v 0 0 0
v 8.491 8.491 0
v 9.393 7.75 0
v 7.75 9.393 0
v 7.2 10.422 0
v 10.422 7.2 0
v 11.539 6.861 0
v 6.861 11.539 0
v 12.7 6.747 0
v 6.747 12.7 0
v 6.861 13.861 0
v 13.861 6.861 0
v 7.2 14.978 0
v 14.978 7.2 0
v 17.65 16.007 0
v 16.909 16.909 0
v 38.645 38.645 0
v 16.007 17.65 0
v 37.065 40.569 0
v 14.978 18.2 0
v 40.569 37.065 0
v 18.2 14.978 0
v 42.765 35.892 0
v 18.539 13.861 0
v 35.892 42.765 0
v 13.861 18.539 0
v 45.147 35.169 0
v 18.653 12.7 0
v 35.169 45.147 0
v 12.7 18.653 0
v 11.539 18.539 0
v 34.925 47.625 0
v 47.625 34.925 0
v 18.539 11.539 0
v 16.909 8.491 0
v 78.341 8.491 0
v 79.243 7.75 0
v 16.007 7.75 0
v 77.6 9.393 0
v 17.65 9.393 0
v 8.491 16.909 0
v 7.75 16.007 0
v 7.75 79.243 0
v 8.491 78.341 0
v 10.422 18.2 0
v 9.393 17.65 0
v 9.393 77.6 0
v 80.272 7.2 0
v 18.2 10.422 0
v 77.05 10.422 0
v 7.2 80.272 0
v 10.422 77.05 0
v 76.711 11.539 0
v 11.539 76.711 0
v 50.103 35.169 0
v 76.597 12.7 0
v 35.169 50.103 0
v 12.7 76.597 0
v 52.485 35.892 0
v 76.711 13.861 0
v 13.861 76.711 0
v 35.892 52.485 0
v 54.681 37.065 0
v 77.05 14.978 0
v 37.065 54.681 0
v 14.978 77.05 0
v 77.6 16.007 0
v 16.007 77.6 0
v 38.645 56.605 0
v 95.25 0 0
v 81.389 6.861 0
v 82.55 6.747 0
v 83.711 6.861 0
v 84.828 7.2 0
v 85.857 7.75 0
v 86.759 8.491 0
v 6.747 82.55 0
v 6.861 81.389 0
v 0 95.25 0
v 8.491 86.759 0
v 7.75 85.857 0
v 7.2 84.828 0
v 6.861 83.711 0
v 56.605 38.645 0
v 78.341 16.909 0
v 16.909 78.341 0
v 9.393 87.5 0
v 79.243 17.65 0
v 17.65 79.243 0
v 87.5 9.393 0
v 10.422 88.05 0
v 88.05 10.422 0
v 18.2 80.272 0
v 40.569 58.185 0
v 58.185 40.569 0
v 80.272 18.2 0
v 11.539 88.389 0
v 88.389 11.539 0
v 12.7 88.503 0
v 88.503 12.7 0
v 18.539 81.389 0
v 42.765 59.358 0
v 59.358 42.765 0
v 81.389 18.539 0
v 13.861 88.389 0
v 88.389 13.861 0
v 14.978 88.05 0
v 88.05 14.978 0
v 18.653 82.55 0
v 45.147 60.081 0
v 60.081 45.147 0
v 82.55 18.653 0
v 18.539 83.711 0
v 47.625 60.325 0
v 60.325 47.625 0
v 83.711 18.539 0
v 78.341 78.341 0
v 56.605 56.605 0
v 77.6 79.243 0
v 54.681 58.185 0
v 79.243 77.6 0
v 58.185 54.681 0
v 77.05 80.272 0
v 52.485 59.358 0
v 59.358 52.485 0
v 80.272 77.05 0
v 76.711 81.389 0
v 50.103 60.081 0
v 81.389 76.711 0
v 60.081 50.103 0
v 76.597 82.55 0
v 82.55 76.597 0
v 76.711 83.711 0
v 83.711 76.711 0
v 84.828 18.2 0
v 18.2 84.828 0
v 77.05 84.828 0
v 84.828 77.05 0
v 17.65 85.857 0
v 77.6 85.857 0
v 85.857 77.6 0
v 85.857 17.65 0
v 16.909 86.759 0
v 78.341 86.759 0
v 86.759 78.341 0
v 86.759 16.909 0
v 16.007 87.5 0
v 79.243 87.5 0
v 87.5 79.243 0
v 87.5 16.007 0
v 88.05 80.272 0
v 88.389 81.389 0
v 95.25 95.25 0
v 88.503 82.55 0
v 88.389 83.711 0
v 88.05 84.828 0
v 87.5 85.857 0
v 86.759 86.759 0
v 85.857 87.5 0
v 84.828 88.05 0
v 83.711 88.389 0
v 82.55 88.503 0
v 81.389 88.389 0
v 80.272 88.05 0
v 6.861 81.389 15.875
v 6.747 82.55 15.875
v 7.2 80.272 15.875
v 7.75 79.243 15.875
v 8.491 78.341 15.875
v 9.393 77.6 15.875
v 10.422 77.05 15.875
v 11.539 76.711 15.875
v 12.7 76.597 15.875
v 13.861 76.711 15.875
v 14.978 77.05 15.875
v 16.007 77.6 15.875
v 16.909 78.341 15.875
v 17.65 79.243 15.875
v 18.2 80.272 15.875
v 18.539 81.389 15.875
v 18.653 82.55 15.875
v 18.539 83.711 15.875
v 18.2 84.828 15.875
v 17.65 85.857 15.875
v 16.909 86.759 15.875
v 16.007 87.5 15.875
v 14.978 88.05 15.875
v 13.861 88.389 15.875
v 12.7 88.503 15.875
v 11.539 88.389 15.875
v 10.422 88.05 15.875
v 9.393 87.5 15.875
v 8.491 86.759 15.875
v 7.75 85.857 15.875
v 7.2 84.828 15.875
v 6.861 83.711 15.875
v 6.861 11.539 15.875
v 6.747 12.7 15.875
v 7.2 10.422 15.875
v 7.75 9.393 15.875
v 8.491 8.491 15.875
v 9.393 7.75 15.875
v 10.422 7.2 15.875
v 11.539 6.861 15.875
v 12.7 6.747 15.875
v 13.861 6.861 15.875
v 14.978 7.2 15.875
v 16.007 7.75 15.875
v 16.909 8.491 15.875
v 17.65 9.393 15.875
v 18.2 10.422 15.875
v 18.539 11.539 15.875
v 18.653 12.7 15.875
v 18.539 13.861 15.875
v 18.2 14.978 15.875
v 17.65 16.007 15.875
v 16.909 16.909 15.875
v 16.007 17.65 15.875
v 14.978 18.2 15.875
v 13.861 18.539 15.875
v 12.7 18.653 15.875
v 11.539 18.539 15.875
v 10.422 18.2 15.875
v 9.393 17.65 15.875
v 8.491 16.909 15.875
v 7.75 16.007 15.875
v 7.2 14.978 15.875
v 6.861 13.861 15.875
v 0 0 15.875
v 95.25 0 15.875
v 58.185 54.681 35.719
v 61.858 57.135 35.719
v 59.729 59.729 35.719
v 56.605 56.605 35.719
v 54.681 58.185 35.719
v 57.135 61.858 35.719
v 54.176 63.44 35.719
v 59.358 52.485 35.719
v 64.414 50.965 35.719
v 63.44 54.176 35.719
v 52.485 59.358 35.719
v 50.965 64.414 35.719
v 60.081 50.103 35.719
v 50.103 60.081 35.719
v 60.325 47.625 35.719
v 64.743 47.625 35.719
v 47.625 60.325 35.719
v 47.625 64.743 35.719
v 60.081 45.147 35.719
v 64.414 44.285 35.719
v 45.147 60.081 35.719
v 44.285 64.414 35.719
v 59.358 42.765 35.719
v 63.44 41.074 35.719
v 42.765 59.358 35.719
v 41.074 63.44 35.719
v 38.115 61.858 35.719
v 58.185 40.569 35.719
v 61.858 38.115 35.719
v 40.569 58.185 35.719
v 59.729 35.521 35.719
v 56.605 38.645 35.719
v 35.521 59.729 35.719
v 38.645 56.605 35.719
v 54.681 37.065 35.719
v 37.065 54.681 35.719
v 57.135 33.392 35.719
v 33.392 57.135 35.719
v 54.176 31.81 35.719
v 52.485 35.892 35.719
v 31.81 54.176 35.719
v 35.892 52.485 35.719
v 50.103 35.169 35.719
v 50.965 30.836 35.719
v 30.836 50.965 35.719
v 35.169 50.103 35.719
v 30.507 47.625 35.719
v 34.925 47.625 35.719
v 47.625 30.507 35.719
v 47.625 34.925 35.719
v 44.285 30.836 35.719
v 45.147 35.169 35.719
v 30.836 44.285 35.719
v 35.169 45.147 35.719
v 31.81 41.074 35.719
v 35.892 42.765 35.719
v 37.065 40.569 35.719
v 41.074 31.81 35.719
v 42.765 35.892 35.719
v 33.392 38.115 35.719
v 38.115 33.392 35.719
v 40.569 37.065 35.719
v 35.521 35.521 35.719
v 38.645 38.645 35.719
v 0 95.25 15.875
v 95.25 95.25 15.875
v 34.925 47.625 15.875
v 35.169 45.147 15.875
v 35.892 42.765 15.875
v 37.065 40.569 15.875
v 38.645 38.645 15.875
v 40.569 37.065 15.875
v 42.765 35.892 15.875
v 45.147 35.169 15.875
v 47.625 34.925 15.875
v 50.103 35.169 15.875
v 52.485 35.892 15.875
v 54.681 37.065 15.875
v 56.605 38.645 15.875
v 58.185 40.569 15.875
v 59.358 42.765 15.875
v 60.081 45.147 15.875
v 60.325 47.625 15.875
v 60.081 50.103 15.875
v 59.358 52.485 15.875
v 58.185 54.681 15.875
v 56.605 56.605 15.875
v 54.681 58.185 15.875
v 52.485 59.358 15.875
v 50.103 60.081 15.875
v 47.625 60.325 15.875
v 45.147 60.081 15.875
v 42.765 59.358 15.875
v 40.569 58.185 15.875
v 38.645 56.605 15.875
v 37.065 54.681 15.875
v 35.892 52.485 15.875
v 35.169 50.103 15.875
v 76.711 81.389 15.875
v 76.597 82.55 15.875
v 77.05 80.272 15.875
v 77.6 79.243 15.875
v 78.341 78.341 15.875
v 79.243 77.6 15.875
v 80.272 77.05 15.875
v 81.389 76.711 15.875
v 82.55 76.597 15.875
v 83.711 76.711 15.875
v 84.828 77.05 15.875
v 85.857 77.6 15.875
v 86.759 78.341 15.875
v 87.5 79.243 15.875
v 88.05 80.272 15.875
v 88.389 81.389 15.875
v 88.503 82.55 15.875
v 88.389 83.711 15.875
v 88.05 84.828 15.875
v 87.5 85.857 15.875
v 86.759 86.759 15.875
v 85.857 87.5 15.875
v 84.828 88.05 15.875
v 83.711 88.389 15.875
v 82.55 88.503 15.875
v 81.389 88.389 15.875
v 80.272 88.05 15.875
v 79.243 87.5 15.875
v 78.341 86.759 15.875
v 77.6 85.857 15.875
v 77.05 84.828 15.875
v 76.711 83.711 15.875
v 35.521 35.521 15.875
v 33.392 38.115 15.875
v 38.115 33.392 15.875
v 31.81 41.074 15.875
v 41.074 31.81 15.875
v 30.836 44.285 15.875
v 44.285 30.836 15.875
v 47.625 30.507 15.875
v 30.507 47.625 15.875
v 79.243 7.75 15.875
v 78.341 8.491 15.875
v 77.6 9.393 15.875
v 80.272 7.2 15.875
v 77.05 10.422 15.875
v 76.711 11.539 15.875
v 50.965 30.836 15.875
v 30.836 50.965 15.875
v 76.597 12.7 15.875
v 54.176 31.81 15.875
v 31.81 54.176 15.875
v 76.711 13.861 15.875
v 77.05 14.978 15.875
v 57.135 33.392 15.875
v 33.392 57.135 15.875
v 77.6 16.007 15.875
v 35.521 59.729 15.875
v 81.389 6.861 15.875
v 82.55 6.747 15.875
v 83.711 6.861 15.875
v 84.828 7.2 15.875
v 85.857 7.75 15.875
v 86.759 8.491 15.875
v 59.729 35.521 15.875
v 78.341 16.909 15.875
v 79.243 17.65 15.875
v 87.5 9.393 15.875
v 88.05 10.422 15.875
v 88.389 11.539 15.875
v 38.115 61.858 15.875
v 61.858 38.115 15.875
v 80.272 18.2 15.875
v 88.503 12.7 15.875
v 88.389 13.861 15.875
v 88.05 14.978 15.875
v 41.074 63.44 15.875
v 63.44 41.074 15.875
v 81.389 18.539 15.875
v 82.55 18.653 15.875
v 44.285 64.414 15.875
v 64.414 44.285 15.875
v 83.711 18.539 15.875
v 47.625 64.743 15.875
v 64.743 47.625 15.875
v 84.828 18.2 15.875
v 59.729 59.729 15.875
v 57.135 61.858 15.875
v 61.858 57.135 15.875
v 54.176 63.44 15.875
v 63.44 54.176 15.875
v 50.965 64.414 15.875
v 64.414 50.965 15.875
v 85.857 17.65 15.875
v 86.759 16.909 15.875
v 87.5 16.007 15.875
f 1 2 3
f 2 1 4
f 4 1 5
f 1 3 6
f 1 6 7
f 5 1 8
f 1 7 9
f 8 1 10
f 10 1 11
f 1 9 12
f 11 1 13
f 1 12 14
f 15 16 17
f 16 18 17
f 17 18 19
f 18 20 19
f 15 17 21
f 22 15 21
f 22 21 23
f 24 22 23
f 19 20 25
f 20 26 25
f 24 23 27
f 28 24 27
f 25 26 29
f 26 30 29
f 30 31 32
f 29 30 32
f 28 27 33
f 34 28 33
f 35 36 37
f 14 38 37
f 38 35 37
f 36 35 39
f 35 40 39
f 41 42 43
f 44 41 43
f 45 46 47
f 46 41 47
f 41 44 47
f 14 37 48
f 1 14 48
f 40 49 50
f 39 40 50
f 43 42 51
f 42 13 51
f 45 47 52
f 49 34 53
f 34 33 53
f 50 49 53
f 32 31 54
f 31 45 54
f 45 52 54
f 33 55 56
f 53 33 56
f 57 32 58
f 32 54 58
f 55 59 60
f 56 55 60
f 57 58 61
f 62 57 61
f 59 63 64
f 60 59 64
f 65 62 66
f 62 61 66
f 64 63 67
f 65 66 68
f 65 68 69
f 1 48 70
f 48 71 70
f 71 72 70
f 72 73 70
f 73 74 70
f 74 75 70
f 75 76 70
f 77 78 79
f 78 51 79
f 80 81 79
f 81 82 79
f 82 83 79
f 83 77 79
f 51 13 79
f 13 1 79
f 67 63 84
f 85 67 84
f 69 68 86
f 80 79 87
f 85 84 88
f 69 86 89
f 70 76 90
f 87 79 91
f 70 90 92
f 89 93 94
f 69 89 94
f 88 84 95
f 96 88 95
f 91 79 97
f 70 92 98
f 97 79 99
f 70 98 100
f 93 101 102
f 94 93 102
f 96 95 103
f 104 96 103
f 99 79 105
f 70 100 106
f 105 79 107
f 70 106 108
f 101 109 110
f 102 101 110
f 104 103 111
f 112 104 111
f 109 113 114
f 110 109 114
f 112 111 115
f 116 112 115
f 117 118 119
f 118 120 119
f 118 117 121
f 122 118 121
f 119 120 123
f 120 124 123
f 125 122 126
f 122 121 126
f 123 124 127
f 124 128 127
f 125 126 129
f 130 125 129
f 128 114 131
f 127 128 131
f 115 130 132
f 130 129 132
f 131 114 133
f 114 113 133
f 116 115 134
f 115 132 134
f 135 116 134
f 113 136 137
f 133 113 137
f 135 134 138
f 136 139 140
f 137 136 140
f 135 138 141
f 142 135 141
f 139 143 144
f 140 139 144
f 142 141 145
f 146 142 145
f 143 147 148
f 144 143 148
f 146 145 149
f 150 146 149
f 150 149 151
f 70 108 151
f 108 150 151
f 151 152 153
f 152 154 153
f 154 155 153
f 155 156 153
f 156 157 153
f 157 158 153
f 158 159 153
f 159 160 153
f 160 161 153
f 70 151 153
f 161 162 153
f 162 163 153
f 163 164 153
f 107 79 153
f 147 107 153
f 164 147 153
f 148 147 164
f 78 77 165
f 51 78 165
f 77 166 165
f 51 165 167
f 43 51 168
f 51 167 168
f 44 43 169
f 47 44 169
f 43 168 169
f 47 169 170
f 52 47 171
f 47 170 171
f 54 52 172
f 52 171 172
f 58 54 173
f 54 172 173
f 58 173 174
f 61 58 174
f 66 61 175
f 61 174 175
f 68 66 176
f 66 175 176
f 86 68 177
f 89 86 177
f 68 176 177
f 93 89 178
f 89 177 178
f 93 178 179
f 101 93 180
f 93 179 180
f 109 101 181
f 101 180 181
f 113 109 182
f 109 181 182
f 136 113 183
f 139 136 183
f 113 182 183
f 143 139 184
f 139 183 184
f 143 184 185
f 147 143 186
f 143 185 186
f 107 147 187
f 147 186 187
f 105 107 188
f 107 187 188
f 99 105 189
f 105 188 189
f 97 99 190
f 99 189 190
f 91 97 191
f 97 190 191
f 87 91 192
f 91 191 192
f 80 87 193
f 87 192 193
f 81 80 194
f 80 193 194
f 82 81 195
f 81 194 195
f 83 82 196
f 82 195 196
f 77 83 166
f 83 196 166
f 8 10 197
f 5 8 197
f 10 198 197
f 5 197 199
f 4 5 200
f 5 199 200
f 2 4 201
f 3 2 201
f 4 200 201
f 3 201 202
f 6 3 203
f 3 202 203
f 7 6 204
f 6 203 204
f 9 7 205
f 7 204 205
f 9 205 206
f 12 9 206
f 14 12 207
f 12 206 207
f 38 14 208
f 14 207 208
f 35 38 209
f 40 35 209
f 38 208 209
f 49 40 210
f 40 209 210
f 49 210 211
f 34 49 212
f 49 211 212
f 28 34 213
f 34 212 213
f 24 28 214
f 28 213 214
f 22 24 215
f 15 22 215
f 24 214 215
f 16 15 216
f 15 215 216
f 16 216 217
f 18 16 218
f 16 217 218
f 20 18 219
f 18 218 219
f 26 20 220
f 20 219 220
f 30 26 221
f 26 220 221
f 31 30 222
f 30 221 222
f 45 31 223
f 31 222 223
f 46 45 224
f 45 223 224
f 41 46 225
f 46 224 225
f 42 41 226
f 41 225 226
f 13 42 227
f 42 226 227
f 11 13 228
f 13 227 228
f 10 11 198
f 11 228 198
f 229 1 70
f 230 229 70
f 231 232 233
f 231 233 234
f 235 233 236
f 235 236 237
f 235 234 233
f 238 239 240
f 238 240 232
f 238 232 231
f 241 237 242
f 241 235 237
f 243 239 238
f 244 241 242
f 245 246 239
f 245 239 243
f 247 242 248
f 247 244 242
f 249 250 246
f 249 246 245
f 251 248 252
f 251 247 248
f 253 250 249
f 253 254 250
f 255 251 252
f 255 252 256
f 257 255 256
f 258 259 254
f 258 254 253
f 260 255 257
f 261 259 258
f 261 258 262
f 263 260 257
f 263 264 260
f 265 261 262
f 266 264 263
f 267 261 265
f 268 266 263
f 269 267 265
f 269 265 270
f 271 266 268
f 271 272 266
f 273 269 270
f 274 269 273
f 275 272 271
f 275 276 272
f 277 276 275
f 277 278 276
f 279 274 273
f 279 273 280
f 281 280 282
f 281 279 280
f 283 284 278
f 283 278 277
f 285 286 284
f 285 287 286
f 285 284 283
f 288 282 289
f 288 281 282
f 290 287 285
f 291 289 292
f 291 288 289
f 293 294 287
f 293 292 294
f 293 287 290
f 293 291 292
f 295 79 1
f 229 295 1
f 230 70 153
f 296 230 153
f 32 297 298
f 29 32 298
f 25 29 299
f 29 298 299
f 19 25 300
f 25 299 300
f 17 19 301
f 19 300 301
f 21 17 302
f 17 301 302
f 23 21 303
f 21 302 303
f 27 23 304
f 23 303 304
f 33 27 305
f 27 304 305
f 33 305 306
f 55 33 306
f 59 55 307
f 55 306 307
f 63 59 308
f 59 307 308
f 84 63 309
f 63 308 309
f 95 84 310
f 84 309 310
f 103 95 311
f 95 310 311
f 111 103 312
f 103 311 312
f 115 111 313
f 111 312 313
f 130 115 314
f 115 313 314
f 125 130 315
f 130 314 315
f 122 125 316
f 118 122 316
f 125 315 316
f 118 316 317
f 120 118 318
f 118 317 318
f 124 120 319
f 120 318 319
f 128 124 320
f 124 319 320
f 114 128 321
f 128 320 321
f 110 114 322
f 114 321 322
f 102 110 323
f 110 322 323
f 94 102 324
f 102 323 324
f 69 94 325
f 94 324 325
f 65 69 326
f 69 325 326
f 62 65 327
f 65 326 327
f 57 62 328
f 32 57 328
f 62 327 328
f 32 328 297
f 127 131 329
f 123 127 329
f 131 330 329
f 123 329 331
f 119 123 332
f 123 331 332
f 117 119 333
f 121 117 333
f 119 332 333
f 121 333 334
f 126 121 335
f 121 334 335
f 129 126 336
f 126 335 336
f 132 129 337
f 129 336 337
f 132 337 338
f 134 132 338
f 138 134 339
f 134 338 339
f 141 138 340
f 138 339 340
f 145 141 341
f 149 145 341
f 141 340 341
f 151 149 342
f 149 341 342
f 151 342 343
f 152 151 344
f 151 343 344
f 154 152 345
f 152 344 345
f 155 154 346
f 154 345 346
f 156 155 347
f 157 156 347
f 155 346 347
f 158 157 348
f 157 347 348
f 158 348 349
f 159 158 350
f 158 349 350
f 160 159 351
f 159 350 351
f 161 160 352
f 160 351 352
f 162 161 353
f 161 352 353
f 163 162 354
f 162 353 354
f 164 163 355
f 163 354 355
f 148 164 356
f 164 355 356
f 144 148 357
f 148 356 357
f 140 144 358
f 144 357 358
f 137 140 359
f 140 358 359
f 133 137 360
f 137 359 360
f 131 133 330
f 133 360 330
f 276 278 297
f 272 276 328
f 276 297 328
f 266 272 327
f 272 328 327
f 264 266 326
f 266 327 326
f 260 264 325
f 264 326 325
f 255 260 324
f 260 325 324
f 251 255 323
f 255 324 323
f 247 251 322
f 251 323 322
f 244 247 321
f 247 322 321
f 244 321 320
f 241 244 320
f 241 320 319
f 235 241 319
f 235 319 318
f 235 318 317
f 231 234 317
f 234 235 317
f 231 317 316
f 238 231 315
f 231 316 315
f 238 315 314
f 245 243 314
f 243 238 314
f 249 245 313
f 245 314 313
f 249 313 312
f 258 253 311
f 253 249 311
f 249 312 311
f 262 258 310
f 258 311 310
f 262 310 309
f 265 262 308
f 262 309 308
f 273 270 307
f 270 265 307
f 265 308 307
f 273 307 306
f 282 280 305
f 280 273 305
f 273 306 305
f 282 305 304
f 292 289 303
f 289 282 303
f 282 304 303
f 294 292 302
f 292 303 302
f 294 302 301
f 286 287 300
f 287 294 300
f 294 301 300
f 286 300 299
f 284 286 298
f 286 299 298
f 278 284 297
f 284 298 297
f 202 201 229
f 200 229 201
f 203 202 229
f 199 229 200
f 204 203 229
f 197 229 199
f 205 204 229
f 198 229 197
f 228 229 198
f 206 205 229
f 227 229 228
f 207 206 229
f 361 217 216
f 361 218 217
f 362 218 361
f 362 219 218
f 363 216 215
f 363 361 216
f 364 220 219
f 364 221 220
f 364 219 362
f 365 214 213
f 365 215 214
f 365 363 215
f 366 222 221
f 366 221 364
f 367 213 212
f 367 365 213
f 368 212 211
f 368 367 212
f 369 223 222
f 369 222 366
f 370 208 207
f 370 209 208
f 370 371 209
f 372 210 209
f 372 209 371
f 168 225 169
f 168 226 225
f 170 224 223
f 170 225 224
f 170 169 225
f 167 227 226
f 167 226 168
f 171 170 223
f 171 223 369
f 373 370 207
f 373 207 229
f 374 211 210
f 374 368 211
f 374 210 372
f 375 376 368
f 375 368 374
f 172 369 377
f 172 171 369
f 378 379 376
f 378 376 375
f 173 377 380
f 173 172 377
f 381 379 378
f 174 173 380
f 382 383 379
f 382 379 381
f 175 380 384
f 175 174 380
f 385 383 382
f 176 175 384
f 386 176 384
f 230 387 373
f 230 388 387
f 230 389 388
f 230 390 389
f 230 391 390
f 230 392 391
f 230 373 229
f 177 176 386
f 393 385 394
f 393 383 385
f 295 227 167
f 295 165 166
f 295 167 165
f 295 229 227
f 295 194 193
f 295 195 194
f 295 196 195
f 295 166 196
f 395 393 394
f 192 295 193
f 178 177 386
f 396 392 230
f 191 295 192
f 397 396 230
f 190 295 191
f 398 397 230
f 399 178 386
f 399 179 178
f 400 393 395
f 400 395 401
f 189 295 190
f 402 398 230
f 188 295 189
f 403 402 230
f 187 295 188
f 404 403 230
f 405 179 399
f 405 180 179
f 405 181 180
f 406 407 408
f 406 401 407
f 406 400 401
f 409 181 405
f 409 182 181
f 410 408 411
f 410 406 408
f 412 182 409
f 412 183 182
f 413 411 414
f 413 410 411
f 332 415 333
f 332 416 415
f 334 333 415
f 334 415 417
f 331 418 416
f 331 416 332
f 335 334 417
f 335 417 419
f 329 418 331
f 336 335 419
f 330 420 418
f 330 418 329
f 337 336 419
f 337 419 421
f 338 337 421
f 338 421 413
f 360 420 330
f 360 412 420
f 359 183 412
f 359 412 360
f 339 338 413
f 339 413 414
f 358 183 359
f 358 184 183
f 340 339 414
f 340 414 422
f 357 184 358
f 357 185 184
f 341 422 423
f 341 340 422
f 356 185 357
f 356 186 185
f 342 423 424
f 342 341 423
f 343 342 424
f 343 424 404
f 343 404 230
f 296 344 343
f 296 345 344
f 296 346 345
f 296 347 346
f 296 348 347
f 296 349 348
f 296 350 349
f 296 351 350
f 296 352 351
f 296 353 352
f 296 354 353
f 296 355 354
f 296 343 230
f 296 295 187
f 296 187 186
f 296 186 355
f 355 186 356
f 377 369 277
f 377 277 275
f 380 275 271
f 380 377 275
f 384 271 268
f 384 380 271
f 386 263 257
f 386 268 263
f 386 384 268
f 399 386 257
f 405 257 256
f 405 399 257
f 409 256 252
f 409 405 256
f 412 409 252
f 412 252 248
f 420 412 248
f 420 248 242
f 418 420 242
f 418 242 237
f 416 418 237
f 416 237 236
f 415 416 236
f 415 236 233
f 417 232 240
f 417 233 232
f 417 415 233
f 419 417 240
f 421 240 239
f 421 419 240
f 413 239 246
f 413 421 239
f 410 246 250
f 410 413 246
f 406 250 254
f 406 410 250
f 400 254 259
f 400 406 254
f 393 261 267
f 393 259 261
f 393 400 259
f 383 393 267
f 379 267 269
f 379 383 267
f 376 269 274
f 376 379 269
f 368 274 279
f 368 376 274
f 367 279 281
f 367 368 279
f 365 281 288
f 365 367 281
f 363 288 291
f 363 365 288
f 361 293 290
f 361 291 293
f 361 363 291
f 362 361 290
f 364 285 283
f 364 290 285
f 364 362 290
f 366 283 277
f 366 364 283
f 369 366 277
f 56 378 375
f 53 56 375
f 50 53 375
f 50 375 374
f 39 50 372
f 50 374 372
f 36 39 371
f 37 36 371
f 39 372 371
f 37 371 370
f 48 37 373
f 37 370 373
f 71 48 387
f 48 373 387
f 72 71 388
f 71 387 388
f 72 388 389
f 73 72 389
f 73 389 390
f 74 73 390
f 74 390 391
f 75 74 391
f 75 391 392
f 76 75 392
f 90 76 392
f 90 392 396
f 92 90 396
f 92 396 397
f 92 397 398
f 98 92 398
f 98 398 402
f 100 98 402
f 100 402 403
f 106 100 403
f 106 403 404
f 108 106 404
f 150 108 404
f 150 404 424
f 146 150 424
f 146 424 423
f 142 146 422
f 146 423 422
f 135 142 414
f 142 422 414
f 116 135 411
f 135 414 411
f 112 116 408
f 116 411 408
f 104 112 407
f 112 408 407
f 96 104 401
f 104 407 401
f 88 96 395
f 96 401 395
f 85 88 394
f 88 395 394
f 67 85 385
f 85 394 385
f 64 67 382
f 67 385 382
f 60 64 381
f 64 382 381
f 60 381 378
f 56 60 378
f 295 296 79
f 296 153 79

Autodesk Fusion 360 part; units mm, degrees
sketch "Sketch4" plane through (0, 0, 0) normal (0, 0, 1) x (1, 0, 0)
  line L0 (0, 0) -> (95.25, 0)
  line L1 (95.25, 0) -> (95.25, 95.25)
  line L2 (95.25, 95.25) -> (0, 95.25)
  line L3 (0, 95.25) -> (0, 0)
  dimension "d17" = 95.25
  dimension "d18" = 95.25
extrude "Extrude4" add sketch "Sketch4" along normal blind 15.875
sketch "Sketch5" plane through (0, 0, 15.875) normal (0, 0, 1) x (-1, 0, 0)
  line L0 (0, -95.25) -> (0, 0)
  line L1 (0, 0) -> (-95.25, 0)
  line L2 (-95.25, 0) -> (-95.25, -95.25)
  line L3 (-95.25, -95.25) -> (0, -95.25)
  line L4 (0, -95.25) -> (-47.625, -95.25)
  line L5 (-47.625, -95.25) -> (-47.625, -47.625)
  line L6 (-47.625, -47.625) -> (0, -47.625)
  line L7 (0, -47.625) -> (0, -95.25)
  circle A0 centre (-47.625, -47.625) radius 12.7
  dimension "d21" = 47.625
  dimension "d22" = 47.625
  dimension "d23" = 25.4
extrude "Extrude5" cut sketch "Sketch5" against normal blind 25 contours L5 L6 A0 | L5 L6 A0
sketch "Sketch6" plane through (0, 0, 15.875) normal (0, 0, 1) x (-1, 0, 0)
  circle A0 centre (-47.625, -47.625) radius 12.7
  line L0 (0, -95.25) -> (0, 0)
  line L1 (0, 0) -> (-95.25, 0)
  line L2 (-95.25, 0) -> (-95.25, -95.25)
  line L3 (-95.25, -95.25) -> (0, -95.25)
  circle A1 centre (-47.625, -47.625) radius 17.1179
extrude "Extrude6" add sketch "Sketch6" along normal blind 19.8438 contours A1
sketch "Sketch7" plane through (0, 0, 15.875) normal (0, 0, 1) x (-1, 0, 0)
  circle A0 centre (-47.625, -47.625) radius 17.1179
  line L0 (0, -95.25) -> (0, 0)
  line L1 (0, 0) -> (-95.25, 0)
  line L2 (-95.25, 0) -> (-95.25, -95.25)
  line L3 (-95.25, -95.25) -> (0, -95.25)
  circle A1 centre (-47.625, -47.625) radius 34.925
  line L4 (-47.625, -95.25) -> (-47.625, -82.55)
  line L5 (0, -50) -> (-12.7808, -50)
  line L6 (0, -95.25) -> (-12.7, -95.25)
  line L7 (-12.7, -95.25) -> (-12.7, -82.55)
  line L8 (-12.7, -82.55) -> (0, -82.55)
  line L9 (0, -82.55) -> (0, -95.25)
  line L10 (-95.25, -95.25) -> (-82.55, -95.25)
  line L11 (-82.55, -95.25) -> (-82.55, -82.55)
  line L12 (-82.55, -82.55) -> (-95.25, -82.55)
  line L13 (-95.25, -82.55) -> (-95.25, -95.25)
  line L14 (0, 0) -> (-12.7, 0)
  line L15 (-12.7, 0) -> (-12.7, -12.7)
  line L16 (-12.7, -12.7) -> (0, -12.7)
  line L17 (0, -12.7) -> (0, 0)
  line L18 (-95.25, 0) -> (-82.55, 0)
  line L19 (-82.55, 0) -> (-82.55, -12.7)
  line L20 (-82.55, -12.7) -> (-95.25, -12.7)
  line L21 (-95.25, -12.7) -> (-95.25, 0)
  circle A2 centre (-12.7, -82.55) radius 4.7625
  circle A3 centre (-82.55, -82.55) radius 4.7625
  circle A4 centre (-12.7, -12.7) radius 4.7625
  circle A5 centre (-82.55, -12.7) radius 4.7625
  dimension "d28" = 69.85
  dimension "d29" = 12.7
  dimension "d30" = 12.7
  dimension "d31" = 12.7
  dimension "d32" = 12.7
  dimension "d33" = 12.7
  dimension "d34" = 12.7
  dimension "d35" = 12.7
  dimension "d36" = 12.7
  dimension "d37" = 9.525
  dimension "d38" = 9.525
  dimension "d39" = 9.525
  dimension "d40" = 9.525
extrude "Extrude7" cut sketch "Sketch7" against normal blind 30 contours L7 L8 A2 | L7 L8 A2 | L15 L16 A4 | L15 L16 A4 | L11 L12 A3 | L11 L12 A3 | L19 L20 A5 | L19 L20 A5
sketch "Sketch8" plane through (0, 0, 15.875) normal (0, 0, 1) x (-1, 0, 0)
  circle A0 centre (-12.7, -12.7) radius 4.7625
  circle A1 centre (-82.55, -12.7) radius 4.7625
  circle A2 centre (-12.7, -82.55) radius 4.7625
  circle A3 centre (-82.55, -82.55) radius 4.7625
  circle A4 centre (-47.625, -47.625) radius 17.1179
  line L0 (0, -95.25) -> (0, 0)
  line L1 (0, 0) -> (-95.25, 0)
  line L2 (-95.25, 0) -> (-95.25, -95.25)
  line L3 (-95.25, -95.25) -> (0, -95.25)
  circle A5 centre (-12.7, -12.7) radius 5.953
  circle A6 centre (-12.7, -82.55) radius 5.953
  circle A7 centre (-82.55, -82.55) radius 5.953
  circle A8 centre (-82.55, -12.7) radius 5.953
  dimension "d43" = 11.906
  dimension "d44" = 11.906
  dimension "d45" = 11.906
  dimension "d46" = 11.906
extrude "Extrude8" cut sketch "Sketch8" against normal blind 35 contours A5 | A6 | A7 | A8
equation "d21 = ( 95.25 / 2 ) * 1 mm"
equation "d22 = ( 95.25 / 2 ) * 1 mm"
equation "d23 = ( 12.7 * 2 ) * 1 mm"
